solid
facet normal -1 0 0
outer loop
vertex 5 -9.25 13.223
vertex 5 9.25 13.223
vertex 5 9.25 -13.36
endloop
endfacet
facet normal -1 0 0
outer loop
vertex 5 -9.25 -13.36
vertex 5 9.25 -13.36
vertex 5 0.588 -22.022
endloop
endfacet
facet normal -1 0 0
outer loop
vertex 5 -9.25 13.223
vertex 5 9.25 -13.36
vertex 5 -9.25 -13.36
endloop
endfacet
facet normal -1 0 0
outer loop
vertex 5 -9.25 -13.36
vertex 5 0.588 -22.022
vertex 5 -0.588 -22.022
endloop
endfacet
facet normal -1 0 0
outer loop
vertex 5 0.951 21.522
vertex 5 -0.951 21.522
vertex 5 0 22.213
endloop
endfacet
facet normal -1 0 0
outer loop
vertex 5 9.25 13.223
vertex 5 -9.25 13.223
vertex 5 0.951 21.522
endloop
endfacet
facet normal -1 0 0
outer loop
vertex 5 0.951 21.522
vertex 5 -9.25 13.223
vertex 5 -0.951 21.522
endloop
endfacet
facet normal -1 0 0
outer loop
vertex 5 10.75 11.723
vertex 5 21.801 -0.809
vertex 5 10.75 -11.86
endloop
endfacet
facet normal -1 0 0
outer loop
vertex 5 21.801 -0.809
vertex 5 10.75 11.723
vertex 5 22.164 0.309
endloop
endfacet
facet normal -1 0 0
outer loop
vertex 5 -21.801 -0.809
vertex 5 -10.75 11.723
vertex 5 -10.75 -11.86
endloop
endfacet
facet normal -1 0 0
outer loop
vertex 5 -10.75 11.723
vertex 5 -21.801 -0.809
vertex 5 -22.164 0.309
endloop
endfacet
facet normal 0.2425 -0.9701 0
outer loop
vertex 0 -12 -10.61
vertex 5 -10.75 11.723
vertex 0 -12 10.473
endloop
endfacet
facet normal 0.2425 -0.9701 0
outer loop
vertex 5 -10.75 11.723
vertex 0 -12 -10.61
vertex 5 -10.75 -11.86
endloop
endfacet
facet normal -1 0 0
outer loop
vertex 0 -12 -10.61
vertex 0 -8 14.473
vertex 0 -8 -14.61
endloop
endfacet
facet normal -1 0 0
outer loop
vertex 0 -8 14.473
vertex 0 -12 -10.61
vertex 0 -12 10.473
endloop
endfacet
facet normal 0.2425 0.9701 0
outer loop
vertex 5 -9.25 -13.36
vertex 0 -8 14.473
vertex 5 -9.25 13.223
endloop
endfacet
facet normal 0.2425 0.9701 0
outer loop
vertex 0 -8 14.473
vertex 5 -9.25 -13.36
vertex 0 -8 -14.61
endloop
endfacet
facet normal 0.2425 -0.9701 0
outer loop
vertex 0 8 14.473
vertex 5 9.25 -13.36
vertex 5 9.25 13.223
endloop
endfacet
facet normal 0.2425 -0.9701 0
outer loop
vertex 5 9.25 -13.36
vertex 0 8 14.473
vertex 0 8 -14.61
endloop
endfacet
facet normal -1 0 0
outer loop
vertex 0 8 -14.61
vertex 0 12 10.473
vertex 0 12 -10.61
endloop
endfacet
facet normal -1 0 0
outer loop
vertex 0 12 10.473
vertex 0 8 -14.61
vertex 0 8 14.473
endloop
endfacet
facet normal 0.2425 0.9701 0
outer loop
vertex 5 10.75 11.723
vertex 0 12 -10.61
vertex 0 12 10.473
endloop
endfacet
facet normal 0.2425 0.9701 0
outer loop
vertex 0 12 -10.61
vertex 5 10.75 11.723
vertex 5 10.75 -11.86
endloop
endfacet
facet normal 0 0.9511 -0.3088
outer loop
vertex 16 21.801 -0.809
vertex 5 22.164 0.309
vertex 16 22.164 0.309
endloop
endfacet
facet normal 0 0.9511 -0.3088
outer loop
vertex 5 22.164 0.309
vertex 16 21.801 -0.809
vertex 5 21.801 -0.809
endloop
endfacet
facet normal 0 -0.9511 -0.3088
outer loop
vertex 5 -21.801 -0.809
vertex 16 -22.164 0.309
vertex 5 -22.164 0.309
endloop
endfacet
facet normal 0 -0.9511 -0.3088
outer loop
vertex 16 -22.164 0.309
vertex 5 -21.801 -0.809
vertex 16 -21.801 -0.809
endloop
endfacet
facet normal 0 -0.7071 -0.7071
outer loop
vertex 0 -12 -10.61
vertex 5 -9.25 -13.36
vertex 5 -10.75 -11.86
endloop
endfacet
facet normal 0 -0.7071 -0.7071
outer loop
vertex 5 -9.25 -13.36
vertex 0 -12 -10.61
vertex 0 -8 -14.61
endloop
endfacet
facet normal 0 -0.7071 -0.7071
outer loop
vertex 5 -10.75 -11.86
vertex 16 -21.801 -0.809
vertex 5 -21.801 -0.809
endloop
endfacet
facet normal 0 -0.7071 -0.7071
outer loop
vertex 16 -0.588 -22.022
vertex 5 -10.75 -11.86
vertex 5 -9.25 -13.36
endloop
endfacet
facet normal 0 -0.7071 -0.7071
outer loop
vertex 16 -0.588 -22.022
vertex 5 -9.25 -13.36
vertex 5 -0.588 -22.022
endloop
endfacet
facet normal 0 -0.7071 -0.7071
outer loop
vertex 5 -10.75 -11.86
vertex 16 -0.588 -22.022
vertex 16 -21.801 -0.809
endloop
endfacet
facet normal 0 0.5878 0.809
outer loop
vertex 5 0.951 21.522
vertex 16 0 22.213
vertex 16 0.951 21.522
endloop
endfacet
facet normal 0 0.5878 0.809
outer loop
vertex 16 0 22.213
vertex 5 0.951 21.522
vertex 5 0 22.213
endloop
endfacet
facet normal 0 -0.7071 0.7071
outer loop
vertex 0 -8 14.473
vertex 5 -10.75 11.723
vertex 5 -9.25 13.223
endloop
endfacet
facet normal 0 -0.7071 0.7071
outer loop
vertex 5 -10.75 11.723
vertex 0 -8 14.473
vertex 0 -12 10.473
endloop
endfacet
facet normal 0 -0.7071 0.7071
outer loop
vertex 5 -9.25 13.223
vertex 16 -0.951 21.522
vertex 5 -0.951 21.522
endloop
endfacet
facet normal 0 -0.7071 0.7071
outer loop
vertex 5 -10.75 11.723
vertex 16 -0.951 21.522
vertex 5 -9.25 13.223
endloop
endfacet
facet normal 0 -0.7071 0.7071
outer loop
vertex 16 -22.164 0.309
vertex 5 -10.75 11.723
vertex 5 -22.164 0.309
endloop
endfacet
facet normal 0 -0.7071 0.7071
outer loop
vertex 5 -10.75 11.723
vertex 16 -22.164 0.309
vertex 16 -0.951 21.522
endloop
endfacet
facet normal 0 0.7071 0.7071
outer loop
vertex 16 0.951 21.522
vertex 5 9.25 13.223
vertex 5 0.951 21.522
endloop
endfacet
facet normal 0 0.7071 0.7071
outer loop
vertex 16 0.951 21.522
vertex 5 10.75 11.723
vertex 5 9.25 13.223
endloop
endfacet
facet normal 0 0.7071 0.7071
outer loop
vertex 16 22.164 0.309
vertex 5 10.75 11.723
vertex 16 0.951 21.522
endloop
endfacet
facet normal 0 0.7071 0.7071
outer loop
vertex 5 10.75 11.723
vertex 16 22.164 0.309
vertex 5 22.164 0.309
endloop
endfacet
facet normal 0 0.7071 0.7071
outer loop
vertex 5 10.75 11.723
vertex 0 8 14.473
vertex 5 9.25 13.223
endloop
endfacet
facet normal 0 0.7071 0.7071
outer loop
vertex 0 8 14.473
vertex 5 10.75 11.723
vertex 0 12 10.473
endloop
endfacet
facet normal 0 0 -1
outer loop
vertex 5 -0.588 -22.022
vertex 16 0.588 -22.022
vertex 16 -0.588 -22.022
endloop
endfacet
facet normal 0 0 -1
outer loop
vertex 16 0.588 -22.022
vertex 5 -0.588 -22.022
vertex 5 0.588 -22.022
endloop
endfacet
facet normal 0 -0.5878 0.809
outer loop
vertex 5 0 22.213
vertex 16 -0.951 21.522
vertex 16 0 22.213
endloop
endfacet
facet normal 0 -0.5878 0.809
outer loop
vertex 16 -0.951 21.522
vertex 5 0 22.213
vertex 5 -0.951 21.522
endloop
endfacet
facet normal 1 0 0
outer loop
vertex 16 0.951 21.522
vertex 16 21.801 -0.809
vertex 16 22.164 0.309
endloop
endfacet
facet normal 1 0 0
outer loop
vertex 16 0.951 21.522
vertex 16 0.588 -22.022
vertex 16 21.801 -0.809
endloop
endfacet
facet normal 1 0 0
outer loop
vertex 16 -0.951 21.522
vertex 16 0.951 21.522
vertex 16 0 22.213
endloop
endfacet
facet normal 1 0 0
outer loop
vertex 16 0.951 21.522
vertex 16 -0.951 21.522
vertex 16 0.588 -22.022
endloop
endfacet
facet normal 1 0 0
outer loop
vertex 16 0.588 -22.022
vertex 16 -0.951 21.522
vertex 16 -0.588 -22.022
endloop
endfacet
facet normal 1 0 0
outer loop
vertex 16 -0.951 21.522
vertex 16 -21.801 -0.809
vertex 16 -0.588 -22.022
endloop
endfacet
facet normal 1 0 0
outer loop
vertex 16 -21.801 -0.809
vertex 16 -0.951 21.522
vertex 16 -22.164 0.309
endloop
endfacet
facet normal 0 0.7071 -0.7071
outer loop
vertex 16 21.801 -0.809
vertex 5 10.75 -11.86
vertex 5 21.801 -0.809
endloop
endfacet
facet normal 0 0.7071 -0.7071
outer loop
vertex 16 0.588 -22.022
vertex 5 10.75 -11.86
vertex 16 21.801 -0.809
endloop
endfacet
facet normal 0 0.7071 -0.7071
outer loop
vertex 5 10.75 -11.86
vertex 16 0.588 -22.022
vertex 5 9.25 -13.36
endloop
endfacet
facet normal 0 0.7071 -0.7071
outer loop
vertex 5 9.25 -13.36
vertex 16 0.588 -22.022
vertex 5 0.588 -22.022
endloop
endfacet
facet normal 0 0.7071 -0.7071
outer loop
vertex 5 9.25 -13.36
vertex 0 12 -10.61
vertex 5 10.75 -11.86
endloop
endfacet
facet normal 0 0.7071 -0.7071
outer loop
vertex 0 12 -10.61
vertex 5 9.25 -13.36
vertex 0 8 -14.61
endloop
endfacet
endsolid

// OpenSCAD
module dovetail(){
	translate([0,-10,-15])  linear_extrude(height=80, convexity=10, twist=0)
	polygon(points=[[0,-2],[0,2],[8,0]]);
}
	




module side1(){
	difference(){
	minkowski()
{
	rotate([45,0,0]) cube([10,40,40], center=true);
	rotate([0,-90,0]) cylinder(r=1,h=1);
}
	translate([0,0,-15]) dovetail();
	translate([0,20,-15]) dovetail();
}
}


difference(){
	minkowski()
{
	translate([6,0,0]) rotate([45,0,0]) cube([20,30,30], center=true);
	rotate([0,-90,0]) cylinder(r=1,h=1);
}
	side1();
}
